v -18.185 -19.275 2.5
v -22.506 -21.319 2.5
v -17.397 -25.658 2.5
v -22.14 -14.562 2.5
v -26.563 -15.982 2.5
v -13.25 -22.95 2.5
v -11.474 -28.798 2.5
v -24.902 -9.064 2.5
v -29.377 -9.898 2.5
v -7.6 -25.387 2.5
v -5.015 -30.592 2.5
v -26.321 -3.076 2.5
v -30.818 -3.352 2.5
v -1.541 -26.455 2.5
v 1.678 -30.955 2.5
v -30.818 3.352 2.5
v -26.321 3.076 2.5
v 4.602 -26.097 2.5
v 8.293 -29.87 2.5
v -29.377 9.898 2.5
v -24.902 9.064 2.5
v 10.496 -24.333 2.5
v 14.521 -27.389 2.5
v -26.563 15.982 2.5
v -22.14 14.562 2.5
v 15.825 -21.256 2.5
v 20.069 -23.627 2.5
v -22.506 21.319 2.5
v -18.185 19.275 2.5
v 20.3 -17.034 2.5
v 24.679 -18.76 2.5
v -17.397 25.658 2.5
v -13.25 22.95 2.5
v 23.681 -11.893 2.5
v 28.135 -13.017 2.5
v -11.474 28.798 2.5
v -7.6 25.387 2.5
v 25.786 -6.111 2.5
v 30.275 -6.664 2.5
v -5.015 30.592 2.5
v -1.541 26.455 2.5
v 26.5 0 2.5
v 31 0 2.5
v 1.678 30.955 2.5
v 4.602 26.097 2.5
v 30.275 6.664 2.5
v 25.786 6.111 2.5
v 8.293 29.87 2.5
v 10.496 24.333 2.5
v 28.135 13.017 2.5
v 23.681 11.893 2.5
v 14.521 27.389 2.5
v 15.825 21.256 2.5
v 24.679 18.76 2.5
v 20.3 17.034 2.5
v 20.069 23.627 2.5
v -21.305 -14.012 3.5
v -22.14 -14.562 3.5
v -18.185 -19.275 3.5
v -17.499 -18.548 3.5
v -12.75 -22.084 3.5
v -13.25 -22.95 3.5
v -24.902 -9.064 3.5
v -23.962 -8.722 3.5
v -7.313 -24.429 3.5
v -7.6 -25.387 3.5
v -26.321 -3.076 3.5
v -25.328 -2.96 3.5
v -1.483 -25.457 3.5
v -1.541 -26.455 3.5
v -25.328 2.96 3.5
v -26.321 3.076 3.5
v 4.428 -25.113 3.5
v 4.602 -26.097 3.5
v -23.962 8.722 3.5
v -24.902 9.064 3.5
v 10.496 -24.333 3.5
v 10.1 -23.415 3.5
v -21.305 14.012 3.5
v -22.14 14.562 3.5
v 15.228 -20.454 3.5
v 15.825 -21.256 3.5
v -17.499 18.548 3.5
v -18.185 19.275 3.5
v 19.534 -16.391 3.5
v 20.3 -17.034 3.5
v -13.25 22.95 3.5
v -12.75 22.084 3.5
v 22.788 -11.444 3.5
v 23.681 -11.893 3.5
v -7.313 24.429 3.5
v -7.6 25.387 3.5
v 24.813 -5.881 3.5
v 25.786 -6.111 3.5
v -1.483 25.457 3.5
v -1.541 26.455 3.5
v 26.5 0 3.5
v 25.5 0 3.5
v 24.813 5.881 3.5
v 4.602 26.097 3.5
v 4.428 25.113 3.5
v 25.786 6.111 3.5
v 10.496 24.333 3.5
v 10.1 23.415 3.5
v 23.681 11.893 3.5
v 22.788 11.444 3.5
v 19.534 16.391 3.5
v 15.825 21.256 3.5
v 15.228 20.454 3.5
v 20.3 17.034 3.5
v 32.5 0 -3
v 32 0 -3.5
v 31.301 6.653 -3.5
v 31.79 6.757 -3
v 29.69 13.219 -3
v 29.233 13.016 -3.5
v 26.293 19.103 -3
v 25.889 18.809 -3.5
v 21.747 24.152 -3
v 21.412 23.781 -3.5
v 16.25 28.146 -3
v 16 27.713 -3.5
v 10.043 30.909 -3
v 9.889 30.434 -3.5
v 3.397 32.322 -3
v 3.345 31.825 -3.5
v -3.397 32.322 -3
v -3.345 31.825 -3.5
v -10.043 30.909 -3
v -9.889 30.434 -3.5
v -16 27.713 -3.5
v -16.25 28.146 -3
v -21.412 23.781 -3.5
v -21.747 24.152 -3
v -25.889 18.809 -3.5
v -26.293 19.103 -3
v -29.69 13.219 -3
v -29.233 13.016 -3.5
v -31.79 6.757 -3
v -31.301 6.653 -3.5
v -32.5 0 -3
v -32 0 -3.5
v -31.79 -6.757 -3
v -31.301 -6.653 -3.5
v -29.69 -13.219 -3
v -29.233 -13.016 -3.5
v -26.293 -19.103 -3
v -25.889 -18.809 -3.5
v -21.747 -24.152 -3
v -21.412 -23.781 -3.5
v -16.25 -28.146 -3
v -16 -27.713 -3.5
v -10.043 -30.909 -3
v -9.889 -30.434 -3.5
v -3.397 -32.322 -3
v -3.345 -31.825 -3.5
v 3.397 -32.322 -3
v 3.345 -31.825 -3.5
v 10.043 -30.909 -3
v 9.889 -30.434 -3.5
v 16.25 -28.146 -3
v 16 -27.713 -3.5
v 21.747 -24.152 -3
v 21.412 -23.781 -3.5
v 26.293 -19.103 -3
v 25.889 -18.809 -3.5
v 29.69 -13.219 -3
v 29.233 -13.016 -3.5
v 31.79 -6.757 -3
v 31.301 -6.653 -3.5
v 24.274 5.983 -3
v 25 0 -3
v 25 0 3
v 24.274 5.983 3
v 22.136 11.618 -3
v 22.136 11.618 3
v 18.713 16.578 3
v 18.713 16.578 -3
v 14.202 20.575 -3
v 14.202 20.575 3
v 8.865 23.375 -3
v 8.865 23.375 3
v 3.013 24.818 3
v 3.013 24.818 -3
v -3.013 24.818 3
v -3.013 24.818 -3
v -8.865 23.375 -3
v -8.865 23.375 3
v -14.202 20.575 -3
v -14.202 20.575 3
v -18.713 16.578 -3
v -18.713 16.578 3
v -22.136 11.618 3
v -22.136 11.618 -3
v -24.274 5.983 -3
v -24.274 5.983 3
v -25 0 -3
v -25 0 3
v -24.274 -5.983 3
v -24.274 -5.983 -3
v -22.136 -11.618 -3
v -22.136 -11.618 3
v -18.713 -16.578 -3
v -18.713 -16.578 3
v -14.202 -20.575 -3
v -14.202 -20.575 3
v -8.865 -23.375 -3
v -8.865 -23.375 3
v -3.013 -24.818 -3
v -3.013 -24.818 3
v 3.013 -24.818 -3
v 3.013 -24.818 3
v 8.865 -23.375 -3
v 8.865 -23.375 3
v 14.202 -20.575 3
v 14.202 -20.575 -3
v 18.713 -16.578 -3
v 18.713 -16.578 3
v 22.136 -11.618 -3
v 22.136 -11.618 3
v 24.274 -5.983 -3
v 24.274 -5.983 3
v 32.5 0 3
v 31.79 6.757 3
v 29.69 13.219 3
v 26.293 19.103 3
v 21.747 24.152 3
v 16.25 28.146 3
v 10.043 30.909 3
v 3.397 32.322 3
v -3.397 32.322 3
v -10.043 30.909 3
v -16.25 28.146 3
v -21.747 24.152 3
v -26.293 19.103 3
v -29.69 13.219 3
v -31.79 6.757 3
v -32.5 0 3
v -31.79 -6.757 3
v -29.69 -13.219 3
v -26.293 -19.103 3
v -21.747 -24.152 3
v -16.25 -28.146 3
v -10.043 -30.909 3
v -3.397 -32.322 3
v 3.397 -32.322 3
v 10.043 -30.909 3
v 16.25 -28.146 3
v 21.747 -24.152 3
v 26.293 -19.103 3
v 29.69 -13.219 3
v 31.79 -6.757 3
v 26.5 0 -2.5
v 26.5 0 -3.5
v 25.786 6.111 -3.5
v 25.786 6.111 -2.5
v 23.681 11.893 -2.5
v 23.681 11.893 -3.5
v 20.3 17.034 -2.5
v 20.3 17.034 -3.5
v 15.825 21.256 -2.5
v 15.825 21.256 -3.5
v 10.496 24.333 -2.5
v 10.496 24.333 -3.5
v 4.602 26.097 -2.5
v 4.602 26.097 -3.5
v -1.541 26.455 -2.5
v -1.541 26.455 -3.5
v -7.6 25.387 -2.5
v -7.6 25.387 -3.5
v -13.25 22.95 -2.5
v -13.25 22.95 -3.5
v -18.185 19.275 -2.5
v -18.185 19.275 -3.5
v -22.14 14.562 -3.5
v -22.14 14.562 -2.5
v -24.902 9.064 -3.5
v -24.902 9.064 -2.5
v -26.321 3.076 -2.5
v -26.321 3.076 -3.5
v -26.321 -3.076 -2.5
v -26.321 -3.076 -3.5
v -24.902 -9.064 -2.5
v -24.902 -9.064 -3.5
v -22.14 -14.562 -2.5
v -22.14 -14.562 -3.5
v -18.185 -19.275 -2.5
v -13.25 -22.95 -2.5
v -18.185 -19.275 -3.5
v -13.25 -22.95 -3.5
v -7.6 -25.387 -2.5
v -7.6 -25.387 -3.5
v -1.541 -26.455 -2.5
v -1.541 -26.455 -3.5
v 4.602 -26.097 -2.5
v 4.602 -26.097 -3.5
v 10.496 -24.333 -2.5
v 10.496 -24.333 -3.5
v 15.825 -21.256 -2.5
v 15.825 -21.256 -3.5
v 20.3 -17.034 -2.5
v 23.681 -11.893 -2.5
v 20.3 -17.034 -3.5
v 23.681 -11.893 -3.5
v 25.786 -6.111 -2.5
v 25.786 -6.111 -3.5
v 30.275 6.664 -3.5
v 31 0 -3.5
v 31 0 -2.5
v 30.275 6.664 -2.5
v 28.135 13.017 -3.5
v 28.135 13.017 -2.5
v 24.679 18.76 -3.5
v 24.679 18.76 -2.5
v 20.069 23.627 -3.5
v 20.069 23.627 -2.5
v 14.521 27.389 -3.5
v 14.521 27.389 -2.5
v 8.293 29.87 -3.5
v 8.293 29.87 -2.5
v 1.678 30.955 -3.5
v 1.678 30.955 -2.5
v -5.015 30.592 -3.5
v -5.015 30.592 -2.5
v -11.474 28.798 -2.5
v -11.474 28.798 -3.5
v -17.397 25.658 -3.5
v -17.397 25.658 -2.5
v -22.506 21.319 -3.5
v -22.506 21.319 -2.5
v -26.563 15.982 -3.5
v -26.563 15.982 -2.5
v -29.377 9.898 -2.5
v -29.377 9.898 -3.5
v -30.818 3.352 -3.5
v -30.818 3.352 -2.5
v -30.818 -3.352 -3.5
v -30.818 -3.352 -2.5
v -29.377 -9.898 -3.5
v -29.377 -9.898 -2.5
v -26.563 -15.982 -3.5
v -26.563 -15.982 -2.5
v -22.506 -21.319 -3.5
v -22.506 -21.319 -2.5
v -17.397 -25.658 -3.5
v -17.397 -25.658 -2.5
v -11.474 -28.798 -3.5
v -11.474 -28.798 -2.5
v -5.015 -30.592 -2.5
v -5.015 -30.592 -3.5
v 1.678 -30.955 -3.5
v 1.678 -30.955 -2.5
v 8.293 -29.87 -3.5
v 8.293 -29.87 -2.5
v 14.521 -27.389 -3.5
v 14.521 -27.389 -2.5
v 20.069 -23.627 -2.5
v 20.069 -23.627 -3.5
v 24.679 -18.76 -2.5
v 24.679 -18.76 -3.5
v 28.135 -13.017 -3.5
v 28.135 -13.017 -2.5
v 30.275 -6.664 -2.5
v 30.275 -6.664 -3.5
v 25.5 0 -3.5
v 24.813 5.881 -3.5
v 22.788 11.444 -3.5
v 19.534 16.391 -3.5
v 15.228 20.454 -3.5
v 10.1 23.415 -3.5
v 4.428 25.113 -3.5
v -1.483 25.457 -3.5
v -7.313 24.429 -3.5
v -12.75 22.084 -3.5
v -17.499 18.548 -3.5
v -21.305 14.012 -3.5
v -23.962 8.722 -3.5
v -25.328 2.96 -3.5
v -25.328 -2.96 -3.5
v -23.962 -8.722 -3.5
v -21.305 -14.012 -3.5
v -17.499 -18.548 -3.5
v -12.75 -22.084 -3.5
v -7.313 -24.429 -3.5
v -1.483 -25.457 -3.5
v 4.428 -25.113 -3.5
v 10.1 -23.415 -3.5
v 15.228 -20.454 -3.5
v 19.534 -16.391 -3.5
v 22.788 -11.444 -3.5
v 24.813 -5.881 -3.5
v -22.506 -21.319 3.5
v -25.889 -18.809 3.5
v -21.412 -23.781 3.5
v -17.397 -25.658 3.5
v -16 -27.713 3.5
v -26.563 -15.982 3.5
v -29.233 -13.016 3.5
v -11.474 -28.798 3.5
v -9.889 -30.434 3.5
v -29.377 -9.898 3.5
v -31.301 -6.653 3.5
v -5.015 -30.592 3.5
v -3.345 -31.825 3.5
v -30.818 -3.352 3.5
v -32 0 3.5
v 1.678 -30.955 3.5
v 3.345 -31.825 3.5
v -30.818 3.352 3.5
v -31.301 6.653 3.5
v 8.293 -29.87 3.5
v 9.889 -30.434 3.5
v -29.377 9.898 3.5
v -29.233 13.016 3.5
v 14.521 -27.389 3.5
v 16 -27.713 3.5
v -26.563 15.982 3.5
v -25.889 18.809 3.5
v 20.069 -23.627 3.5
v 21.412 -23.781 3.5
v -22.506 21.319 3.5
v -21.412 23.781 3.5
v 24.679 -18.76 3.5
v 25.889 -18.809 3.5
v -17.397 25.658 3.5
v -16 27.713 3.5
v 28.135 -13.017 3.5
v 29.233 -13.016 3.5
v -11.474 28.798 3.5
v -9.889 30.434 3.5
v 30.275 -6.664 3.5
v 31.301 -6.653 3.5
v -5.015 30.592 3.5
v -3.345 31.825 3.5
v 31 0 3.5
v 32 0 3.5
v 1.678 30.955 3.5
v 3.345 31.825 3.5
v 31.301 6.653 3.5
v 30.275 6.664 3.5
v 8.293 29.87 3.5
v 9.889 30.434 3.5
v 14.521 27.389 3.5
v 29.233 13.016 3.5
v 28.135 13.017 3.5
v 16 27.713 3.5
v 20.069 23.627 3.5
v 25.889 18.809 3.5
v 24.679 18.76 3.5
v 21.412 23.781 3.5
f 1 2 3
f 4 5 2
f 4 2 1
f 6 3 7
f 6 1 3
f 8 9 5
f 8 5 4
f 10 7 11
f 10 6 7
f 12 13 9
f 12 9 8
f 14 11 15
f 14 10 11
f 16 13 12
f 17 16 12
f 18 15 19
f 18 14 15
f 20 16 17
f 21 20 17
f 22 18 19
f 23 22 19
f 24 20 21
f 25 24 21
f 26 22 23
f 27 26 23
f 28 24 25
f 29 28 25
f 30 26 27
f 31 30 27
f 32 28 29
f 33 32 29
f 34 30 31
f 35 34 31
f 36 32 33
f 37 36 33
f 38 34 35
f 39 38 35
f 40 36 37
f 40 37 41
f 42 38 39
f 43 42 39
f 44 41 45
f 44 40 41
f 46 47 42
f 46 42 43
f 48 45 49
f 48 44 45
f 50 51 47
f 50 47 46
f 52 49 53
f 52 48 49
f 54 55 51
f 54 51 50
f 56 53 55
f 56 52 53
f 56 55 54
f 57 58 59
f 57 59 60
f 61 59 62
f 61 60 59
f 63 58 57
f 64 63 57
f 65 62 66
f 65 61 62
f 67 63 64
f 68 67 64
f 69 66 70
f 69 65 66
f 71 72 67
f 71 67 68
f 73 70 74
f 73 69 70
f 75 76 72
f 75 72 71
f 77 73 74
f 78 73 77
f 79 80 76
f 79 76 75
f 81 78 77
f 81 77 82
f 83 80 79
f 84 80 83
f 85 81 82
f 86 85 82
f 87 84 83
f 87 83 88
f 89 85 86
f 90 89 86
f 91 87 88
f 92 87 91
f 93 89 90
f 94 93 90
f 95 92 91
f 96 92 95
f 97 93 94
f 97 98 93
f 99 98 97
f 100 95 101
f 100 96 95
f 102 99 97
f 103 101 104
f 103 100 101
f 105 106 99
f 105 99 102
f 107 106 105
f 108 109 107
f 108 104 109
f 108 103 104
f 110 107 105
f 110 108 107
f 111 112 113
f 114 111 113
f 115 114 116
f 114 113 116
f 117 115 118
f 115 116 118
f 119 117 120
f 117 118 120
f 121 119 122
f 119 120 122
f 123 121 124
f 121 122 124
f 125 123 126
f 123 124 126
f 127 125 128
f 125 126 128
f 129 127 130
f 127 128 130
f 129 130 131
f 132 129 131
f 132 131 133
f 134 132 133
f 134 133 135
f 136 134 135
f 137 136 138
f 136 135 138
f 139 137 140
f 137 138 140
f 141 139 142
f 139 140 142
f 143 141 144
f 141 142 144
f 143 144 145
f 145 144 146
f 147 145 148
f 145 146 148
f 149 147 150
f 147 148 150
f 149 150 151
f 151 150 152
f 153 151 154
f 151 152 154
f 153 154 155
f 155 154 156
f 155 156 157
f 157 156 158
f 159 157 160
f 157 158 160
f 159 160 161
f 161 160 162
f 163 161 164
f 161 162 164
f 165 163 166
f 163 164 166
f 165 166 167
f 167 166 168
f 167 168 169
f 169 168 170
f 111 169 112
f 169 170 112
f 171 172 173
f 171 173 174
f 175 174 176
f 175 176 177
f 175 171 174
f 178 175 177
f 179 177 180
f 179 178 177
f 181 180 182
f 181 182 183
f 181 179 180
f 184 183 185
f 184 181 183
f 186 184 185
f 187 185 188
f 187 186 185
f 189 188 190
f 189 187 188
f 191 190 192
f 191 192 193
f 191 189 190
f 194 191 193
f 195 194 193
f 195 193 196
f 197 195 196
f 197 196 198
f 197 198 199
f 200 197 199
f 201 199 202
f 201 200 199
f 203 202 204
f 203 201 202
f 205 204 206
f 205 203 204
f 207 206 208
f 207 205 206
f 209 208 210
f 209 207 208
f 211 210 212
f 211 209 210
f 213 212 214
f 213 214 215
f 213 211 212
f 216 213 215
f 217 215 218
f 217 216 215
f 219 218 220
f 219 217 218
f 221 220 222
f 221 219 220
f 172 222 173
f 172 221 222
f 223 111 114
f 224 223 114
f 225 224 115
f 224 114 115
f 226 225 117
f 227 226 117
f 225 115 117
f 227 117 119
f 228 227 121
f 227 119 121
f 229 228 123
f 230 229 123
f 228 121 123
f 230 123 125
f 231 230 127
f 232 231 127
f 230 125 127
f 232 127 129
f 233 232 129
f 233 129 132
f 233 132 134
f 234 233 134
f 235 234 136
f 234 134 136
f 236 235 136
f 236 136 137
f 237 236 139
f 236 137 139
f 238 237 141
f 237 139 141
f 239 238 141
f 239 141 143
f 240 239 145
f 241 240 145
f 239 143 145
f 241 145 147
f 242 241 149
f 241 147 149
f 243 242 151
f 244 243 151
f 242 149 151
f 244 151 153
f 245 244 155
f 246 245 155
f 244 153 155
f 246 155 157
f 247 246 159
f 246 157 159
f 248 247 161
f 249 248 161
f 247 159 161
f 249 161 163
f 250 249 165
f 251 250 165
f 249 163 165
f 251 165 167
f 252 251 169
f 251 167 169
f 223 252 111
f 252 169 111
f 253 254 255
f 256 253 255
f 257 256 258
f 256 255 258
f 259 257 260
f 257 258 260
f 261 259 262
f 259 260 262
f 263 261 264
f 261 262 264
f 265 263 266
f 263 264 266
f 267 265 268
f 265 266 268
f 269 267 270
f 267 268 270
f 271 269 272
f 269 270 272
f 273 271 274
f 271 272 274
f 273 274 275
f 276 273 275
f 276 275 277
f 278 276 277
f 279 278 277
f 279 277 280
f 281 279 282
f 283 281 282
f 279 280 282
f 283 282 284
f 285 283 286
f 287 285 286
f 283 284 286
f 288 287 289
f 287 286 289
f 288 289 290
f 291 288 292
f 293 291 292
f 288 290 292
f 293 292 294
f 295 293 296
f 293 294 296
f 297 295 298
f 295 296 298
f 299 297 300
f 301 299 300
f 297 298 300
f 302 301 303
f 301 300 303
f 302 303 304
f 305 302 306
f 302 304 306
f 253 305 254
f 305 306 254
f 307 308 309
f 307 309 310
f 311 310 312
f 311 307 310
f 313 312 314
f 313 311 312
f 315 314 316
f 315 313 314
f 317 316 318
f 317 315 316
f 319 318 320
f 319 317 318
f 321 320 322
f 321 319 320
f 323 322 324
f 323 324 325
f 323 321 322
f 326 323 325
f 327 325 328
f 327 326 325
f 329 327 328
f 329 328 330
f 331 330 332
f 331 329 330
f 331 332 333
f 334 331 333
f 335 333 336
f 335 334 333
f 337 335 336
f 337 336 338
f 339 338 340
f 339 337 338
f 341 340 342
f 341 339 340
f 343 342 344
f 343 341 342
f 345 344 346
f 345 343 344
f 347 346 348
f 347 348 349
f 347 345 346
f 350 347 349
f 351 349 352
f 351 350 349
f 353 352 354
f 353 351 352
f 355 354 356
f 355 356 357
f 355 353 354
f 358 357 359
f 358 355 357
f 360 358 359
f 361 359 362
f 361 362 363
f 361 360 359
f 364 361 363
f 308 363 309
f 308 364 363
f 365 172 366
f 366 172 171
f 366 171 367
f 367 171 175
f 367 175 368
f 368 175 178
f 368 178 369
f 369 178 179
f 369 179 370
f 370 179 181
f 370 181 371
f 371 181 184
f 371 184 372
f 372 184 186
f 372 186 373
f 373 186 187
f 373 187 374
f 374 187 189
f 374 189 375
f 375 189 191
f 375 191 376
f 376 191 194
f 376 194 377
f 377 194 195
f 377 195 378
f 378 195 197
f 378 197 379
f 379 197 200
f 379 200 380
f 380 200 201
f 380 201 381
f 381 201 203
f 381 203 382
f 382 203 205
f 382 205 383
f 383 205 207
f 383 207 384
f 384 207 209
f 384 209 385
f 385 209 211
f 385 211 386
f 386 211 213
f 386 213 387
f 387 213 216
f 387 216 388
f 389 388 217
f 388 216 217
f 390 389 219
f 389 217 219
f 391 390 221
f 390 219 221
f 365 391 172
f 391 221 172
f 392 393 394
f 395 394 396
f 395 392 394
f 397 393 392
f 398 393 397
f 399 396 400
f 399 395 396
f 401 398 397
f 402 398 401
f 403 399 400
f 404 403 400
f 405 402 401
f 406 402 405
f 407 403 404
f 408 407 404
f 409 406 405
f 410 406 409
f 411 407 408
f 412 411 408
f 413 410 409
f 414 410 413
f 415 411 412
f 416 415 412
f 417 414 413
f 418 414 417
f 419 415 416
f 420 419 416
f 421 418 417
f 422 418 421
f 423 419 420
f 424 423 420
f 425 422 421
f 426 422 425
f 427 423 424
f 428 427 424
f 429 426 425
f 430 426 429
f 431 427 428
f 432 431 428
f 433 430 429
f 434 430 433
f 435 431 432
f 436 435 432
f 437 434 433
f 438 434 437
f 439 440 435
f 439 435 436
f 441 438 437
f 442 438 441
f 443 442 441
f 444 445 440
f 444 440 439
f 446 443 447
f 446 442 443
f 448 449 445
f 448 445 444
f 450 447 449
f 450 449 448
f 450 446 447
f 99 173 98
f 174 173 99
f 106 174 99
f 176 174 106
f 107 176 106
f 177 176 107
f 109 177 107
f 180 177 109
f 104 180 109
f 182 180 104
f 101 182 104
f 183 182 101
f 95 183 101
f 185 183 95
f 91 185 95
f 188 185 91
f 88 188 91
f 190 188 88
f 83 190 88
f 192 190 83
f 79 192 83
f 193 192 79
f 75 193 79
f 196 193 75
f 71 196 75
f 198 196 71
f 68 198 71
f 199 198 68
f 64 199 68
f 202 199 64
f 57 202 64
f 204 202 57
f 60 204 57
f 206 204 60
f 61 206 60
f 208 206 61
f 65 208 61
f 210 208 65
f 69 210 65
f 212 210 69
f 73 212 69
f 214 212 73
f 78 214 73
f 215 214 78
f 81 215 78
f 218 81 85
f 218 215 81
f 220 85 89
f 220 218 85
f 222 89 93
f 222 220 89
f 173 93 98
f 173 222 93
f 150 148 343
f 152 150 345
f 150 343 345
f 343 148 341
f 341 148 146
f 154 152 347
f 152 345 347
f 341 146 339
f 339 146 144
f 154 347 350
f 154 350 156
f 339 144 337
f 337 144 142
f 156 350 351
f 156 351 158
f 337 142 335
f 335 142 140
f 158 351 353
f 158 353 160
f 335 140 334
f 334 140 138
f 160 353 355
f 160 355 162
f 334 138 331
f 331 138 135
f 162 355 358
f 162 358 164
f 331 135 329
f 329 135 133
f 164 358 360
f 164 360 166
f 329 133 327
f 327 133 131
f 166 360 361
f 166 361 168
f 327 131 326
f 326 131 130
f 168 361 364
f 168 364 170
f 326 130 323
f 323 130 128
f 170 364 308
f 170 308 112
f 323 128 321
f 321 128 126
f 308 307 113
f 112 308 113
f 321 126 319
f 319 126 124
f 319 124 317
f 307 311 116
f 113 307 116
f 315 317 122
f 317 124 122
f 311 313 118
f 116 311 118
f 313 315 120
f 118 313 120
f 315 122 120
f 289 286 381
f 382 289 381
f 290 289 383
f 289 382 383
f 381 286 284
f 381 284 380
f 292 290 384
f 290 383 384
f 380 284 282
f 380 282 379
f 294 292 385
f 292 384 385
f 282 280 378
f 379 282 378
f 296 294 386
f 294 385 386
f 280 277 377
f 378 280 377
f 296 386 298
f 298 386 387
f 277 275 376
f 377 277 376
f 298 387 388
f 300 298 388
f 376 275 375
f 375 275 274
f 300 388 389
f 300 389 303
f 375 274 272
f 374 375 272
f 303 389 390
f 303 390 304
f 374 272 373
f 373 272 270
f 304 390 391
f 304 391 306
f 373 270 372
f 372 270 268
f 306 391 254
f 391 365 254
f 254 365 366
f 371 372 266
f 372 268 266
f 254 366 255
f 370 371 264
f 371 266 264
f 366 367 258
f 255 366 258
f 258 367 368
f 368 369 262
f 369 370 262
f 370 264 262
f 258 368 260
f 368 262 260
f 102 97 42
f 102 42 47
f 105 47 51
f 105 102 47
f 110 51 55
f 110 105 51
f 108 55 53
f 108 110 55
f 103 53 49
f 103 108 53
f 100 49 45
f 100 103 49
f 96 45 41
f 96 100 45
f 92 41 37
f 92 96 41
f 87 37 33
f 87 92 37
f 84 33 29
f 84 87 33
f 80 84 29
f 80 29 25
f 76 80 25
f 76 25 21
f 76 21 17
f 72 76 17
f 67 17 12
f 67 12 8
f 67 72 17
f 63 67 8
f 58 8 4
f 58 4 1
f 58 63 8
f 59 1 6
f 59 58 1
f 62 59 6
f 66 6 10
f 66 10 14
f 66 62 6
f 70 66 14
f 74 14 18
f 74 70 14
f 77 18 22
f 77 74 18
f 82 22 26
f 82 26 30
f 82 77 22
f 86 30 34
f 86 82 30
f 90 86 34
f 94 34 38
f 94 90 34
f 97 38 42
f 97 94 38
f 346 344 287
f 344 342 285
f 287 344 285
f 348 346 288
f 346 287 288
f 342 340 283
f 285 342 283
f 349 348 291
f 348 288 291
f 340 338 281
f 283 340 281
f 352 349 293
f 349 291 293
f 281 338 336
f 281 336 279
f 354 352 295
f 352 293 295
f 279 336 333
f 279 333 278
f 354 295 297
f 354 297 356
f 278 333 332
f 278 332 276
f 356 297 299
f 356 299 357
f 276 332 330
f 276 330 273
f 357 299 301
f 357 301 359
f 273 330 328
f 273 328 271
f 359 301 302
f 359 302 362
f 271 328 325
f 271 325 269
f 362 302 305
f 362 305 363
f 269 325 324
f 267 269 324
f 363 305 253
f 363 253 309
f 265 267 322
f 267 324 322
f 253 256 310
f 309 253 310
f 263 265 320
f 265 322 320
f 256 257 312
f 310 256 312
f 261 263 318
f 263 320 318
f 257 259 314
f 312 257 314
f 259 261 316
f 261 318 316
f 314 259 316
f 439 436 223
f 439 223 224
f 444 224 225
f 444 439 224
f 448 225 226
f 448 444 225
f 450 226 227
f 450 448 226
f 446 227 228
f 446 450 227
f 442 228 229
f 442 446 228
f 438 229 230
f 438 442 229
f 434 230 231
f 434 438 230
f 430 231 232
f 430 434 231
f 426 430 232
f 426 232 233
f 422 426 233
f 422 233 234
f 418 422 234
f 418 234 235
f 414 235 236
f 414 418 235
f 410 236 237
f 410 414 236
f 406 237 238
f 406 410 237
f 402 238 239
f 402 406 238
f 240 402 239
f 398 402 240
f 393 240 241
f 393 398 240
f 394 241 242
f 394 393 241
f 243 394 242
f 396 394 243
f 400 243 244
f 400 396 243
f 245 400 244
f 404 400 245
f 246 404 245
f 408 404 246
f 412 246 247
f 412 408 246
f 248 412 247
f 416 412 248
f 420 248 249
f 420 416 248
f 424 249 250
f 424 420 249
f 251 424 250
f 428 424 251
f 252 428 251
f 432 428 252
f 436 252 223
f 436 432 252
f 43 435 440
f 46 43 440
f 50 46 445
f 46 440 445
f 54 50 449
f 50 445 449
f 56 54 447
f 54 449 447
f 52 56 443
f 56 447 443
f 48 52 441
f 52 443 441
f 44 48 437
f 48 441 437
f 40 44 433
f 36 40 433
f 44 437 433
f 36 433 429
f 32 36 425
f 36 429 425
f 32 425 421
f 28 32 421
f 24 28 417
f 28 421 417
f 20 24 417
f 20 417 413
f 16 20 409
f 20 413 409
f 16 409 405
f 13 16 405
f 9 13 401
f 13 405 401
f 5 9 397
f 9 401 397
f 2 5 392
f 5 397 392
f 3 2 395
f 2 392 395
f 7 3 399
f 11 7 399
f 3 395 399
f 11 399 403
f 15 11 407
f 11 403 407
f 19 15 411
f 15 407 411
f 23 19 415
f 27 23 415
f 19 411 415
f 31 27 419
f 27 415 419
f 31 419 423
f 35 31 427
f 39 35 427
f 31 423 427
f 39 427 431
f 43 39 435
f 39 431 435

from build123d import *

# Parameters (mm, degrees)
SKETCH_R      = 32.5
SKETCH_R_2    = 25
PAD_DEPTH     = 7
SKETCH001_R   = 31
SKETCH001_R_2 = 26.5
POCKET_DEPTH  = 1
CHAMFER_SIZE  = 0.5


with BuildPart() as part:
    # Sketch → Pad (new body)
    with BuildSketch(Plane.XY.offset(-3.5)):
        Circle(SKETCH_R)
        Circle(SKETCH_R_2, mode=Mode.SUBTRACT)
    extrude(amount=PAD_DEPTH)

    # Sketch001 (on Face4 of Pad) → Pocket (cut)
    with BuildSketch(Plane.XY.offset(3.5)):
        Circle(SKETCH001_R)
        Circle(SKETCH001_R_2, mode=Mode.SUBTRACT)
    pocket = extrude(amount=-POCKET_DEPTH, mode=Mode.SUBTRACT)

    # Mirrored: Pocket across XY
    add(pocket.mirror(Plane.XY), mode=Mode.SUBTRACT)

    # Chamfer
    chamfer_edges = [part.edges().sort_by_distance(p)[0] for p in [
        (-32.5, 0, 3.5),
        (-32.5, 0, -3.5),
        (-25, 0, 3.5),
        (-25, 0, -3.5),
    ]]
    chamfer(chamfer_edges, length=CHAMFER_SIZE)


solid = part.part
